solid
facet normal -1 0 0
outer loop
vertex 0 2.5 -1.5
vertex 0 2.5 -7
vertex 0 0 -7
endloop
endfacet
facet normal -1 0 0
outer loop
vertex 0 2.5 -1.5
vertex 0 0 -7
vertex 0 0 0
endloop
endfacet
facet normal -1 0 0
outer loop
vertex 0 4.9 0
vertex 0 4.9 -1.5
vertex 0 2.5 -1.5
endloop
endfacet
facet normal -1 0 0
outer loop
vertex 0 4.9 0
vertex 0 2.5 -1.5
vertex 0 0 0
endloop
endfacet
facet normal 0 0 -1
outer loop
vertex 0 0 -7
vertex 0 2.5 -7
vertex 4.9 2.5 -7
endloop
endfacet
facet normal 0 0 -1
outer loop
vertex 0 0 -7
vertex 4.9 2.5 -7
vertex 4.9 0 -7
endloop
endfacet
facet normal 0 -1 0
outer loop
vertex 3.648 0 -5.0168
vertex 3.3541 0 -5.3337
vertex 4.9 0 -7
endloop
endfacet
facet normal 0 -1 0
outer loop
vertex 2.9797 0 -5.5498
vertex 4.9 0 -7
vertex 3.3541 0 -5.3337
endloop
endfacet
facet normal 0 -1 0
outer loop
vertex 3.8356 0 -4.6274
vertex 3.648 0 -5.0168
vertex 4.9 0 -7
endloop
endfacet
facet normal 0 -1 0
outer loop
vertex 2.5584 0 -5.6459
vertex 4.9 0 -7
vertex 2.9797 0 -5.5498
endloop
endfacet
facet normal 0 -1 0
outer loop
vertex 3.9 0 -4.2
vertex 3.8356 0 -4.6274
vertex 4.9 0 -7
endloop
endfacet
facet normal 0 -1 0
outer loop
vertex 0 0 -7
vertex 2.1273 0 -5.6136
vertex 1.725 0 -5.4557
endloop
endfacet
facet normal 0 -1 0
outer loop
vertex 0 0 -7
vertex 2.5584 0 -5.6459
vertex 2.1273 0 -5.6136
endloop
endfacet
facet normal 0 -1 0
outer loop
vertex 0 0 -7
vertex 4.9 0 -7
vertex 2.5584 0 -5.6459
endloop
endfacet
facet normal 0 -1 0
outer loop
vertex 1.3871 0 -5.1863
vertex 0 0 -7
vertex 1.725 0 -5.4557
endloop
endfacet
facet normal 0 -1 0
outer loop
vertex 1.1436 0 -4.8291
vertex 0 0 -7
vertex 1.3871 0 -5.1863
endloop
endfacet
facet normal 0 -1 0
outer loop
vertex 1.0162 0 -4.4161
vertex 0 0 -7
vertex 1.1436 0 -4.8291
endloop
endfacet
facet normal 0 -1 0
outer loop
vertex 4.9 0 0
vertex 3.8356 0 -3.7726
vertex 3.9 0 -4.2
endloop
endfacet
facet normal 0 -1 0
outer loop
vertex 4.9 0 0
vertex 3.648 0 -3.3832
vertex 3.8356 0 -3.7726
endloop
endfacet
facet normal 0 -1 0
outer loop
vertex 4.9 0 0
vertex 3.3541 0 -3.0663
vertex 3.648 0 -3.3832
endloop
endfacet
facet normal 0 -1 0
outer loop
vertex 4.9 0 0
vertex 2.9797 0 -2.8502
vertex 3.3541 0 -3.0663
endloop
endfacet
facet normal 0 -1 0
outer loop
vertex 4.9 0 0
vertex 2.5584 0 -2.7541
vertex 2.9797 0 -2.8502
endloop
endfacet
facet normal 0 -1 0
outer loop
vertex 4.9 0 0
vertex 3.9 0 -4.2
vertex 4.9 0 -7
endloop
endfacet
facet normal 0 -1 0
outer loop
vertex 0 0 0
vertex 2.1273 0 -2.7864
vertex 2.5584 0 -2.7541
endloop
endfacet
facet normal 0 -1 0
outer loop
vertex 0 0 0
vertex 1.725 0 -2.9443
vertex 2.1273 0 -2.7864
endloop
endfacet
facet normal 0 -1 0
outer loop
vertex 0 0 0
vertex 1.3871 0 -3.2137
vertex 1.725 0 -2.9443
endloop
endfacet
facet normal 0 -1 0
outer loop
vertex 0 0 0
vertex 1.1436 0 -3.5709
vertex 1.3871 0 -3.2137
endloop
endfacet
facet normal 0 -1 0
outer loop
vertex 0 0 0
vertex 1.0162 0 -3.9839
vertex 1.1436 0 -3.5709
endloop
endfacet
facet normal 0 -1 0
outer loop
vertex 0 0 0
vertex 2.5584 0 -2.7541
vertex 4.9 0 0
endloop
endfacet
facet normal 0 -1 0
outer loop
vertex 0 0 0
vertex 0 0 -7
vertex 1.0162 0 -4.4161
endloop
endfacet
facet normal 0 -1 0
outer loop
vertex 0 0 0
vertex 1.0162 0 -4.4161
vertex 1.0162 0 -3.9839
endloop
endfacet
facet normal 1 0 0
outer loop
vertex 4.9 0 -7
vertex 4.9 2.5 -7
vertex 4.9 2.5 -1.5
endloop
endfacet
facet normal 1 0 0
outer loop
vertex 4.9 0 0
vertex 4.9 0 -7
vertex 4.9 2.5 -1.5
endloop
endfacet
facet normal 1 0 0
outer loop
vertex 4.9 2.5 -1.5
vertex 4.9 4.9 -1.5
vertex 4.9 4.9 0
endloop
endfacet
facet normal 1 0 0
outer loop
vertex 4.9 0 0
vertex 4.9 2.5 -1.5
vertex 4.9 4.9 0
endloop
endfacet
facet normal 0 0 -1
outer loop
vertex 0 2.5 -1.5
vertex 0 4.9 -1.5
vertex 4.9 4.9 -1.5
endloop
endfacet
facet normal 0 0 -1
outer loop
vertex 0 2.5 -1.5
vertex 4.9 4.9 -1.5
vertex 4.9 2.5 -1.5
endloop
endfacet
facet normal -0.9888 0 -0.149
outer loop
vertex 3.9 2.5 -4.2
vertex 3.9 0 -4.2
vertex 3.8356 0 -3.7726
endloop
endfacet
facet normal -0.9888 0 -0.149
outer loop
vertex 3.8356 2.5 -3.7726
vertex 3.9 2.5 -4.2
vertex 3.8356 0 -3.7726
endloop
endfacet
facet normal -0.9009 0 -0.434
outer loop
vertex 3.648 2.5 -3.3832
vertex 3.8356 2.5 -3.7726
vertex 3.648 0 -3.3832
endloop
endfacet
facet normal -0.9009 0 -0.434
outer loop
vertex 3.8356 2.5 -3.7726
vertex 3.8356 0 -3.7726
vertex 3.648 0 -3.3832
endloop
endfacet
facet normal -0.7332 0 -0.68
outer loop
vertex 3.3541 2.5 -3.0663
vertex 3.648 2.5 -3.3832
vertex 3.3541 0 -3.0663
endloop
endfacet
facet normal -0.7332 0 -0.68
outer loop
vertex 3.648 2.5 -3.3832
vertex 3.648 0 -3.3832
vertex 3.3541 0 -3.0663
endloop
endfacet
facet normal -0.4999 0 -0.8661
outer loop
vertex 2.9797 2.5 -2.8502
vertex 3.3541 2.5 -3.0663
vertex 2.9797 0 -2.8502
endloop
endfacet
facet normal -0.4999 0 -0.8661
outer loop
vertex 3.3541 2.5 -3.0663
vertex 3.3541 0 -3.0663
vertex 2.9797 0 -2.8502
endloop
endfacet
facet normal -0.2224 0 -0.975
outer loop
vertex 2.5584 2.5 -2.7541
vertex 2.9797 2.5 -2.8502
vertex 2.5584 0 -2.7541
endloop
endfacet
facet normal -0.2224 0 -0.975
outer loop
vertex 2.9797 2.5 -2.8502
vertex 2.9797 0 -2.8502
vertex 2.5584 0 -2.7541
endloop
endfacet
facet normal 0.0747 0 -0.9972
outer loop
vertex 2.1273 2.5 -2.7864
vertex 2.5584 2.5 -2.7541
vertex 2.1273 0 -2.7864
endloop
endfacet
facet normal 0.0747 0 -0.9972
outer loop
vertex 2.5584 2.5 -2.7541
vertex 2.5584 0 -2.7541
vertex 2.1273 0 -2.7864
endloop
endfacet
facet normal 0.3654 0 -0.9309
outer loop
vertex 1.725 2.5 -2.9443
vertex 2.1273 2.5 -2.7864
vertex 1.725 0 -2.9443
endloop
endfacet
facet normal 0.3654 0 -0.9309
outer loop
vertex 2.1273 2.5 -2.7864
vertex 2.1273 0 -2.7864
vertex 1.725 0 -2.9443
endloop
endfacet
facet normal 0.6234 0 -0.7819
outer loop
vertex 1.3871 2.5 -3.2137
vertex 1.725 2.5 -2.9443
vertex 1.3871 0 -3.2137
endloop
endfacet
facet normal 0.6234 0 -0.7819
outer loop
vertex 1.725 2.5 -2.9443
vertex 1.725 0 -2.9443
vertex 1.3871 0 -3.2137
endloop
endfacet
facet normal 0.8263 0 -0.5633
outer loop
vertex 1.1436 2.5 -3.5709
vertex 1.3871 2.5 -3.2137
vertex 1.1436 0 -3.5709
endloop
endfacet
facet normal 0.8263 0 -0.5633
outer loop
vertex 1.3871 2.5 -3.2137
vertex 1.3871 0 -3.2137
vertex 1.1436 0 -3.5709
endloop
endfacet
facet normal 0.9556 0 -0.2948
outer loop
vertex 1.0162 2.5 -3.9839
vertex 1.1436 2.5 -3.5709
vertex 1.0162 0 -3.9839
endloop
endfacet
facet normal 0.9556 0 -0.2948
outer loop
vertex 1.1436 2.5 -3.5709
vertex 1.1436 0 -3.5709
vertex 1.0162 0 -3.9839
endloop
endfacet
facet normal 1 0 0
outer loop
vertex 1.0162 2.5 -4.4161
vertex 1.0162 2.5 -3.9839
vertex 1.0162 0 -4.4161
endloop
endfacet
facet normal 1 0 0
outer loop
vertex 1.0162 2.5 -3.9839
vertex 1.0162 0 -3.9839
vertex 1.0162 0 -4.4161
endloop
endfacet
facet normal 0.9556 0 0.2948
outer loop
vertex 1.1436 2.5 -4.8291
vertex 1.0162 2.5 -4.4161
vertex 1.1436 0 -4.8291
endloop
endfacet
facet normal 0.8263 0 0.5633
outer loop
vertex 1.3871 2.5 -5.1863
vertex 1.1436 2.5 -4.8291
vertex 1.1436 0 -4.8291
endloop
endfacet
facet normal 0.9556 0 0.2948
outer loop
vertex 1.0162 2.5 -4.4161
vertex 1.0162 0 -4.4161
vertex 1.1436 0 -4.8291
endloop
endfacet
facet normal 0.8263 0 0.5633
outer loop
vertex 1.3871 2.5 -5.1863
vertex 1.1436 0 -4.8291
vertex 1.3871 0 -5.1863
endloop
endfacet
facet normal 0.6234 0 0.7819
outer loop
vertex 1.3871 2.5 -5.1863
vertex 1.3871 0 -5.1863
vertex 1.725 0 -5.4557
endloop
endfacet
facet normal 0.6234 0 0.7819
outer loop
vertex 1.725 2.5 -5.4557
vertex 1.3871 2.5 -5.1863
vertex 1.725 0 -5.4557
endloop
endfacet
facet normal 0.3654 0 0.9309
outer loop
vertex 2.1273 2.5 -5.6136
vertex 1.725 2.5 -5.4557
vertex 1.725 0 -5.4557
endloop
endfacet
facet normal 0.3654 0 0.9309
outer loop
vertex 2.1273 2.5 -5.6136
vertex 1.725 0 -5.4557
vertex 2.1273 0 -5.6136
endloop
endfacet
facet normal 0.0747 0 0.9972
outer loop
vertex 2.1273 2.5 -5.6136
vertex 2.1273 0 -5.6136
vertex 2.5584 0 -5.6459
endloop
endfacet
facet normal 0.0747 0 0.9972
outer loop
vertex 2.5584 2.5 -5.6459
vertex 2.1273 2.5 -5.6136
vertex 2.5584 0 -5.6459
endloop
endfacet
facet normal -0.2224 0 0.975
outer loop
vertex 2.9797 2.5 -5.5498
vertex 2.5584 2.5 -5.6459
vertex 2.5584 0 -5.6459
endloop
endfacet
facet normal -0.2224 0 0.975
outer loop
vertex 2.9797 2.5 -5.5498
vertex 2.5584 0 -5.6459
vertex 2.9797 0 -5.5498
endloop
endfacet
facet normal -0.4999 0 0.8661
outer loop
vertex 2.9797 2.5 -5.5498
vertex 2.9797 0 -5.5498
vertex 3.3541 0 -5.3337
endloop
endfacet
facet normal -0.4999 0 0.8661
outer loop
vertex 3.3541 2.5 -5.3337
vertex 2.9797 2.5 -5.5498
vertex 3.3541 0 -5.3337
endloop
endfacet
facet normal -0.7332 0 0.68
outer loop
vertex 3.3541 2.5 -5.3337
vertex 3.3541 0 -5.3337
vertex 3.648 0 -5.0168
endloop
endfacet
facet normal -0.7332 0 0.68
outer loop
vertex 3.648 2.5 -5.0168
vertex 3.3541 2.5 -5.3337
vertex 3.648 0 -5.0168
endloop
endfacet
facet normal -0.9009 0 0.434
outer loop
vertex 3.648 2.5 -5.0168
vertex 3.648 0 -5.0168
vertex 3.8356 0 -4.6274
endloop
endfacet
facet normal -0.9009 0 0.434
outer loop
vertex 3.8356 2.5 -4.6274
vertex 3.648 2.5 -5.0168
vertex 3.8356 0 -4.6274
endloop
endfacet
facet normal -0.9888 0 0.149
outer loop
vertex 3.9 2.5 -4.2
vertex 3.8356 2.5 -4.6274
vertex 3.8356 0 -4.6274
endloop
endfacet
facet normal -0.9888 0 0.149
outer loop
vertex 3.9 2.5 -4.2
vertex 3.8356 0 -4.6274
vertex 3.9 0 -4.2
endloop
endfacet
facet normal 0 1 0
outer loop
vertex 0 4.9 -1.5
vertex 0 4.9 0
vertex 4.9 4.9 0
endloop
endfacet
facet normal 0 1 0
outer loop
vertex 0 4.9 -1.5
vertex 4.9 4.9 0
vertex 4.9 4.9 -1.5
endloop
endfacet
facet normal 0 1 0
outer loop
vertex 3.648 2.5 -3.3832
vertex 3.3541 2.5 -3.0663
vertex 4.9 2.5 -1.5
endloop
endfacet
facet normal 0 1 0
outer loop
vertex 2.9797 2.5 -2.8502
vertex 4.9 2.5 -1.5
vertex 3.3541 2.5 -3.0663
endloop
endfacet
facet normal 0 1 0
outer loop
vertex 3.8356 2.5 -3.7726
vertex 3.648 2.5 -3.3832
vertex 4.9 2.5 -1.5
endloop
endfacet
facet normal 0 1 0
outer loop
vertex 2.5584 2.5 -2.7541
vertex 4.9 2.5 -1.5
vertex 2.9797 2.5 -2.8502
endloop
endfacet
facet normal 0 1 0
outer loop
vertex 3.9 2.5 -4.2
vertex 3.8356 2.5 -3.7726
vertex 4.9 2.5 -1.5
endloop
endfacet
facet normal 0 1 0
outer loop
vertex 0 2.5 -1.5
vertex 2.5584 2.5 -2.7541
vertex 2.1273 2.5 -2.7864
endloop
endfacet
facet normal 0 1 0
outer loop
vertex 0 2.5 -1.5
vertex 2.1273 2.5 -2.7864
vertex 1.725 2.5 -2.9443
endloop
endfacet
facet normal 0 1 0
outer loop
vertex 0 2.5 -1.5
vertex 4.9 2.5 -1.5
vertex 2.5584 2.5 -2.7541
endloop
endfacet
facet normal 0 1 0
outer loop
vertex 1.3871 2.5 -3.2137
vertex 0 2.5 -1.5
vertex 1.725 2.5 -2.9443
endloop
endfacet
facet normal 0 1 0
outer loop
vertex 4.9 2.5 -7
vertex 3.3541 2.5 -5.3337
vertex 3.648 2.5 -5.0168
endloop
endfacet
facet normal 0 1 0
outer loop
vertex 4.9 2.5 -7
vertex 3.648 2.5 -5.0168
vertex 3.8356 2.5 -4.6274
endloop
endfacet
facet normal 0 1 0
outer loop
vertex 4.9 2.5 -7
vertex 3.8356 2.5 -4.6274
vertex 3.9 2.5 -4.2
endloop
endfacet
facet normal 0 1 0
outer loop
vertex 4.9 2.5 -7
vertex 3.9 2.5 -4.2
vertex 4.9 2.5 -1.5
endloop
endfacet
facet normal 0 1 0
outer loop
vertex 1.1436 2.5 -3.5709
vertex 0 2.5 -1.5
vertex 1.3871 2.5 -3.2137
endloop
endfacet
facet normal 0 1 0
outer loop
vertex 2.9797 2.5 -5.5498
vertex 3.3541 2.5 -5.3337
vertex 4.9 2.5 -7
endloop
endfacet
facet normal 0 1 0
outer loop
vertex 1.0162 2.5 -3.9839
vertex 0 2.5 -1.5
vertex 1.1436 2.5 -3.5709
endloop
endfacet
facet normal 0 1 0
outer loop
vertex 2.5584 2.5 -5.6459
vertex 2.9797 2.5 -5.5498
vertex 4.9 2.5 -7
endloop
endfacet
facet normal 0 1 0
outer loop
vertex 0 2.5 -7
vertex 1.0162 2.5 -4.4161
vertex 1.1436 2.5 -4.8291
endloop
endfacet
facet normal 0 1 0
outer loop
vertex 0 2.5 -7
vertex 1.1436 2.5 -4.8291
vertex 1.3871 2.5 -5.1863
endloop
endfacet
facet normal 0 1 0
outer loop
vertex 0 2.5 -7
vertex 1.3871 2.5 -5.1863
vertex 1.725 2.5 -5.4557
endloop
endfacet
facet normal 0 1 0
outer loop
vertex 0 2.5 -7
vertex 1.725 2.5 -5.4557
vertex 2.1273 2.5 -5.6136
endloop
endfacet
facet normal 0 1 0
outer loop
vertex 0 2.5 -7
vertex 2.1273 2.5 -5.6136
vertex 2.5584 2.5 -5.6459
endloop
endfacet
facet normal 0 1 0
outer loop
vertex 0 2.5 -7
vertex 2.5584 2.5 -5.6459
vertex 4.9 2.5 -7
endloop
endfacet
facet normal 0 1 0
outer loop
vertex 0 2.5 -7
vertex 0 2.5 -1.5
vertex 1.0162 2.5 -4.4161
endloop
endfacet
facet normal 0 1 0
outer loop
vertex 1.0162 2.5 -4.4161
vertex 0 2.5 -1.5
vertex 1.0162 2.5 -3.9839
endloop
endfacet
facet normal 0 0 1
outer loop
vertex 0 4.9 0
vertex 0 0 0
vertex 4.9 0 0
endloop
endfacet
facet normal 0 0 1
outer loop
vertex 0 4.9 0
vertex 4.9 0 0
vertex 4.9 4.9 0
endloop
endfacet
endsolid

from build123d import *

# Parameters (mm, degrees)
BOSS_EXTRUDE1_DEPTH = 4.9
SKETCH2_R           = 1.45
CUT_EXTRUDE1_DEPTH  = 5.9


with BuildPart() as part:
    # Sketch1 → Boss-Extrude1 (new body)
    with BuildSketch(Plane(origin=(0, 0, 0), x_dir=(0, 0, -1), z_dir=(1, 0, 0))):
        Polygon((0, 0), (0, 4.9), (1.5, 4.9), (1.5, 2.5), (7, 2.5), (7, 0), align=None)
    extrude(amount=BOSS_EXTRUDE1_DEPTH)

    # Sketch2 → Cut-Extrude1 (cut, through all)
    with BuildSketch(Plane.XZ):
        with Locations((2.45, -4.2)):
            Circle(SKETCH2_R)
    extrude(amount=-CUT_EXTRUDE1_DEPTH, mode=Mode.SUBTRACT)


solid = part.part
